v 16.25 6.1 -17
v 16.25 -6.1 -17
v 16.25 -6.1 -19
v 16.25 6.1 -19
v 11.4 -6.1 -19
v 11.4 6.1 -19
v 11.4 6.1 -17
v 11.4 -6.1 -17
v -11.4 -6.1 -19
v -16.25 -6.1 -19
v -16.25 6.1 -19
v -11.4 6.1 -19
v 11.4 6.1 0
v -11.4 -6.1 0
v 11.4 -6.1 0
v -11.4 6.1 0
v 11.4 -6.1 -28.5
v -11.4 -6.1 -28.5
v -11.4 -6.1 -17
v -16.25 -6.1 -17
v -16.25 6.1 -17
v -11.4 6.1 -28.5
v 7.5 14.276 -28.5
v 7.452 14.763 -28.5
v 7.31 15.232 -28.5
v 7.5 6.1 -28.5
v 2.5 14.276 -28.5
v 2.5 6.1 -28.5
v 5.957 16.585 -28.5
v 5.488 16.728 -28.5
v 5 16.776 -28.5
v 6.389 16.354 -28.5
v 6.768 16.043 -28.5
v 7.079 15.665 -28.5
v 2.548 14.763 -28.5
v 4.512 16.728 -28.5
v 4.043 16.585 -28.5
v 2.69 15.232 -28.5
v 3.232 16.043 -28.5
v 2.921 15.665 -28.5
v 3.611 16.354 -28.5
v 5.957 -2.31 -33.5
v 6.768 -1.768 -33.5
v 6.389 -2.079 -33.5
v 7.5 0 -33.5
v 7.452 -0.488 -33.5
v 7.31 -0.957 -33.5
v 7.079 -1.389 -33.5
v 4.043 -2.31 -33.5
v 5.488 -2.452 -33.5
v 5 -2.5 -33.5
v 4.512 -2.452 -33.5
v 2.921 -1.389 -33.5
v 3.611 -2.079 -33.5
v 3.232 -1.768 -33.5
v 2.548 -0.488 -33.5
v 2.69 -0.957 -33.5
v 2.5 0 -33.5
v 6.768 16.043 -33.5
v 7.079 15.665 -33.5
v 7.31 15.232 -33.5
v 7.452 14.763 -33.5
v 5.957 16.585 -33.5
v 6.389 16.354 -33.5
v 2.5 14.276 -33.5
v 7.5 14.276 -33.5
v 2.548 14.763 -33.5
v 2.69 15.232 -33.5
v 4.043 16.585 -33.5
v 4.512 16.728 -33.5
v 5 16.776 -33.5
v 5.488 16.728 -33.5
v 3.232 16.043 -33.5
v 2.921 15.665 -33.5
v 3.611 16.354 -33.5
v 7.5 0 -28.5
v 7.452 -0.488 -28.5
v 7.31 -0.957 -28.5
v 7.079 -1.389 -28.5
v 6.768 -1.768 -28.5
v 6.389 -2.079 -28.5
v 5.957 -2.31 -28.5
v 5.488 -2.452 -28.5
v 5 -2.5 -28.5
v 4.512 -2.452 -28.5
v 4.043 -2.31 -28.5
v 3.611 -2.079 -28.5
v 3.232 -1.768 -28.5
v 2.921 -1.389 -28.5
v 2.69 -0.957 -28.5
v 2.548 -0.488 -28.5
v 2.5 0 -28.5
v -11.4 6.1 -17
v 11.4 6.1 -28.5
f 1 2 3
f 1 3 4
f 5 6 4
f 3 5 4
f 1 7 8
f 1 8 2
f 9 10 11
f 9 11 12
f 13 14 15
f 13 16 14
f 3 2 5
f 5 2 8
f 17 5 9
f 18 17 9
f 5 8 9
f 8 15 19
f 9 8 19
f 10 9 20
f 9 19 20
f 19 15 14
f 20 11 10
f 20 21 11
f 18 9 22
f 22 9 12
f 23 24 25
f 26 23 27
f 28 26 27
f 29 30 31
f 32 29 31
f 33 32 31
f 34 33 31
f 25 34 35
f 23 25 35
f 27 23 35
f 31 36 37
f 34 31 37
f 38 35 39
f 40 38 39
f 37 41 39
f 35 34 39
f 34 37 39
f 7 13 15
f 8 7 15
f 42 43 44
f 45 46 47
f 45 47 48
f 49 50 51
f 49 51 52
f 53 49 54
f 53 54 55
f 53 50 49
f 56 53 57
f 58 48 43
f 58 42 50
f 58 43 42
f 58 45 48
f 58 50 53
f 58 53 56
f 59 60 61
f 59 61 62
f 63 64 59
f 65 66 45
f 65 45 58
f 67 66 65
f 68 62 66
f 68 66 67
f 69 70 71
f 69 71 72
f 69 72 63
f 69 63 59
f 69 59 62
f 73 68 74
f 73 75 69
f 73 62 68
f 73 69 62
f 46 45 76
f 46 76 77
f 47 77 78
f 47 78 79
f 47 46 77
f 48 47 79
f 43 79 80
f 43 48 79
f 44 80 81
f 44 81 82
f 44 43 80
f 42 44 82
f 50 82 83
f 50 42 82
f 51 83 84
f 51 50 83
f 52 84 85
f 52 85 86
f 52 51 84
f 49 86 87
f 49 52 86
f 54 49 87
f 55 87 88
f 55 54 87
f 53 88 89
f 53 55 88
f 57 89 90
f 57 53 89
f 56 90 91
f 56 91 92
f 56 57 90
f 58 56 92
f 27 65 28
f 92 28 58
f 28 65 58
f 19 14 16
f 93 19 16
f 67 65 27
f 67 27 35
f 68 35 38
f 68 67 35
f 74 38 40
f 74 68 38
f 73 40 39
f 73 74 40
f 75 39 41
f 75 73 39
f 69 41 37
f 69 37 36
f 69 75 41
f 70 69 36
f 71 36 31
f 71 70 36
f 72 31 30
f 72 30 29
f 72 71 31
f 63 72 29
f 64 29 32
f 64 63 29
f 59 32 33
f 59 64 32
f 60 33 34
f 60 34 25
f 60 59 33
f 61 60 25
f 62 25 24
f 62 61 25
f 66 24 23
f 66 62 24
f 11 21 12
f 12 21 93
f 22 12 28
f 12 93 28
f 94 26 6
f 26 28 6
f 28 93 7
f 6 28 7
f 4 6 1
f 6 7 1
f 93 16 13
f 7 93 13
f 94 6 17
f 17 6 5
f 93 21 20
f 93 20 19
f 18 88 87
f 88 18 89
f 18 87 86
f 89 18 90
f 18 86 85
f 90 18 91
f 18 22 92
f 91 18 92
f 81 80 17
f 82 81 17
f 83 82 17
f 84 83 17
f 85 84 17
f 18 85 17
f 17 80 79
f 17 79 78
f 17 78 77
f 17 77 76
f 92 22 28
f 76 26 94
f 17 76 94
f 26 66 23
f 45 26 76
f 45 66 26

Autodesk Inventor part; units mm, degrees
ref_plane "YZ Plane" through (0, 0, 0) normal (1, 0, 0) x (0, 1, 0)
ref_plane "XZ Plane" through (0, 0, 0) normal (0, 1, 0) x (-1, 0, 0)
sketch "Náčrt1" plane through (0, 0, 0) normal (0, 0, 1) x (1, 0, 0)
  line L0 (-11.4, 6.1) -> (11.4, 6.1)
  line L1 (11.4, 6.1) -> (11.4, -6.1)
  line L2 (11.4, -6.1) -> (-11.4, -6.1)
  line L3 (-11.4, -6.1) -> (-11.4, 6.1)
  line L4 (0, 8.54) -> (0, -8.54) projected
  line L5 (-15.96, 0) -> (15.96, 0) projected
  point P0 (0, 0)
  dimension "d0" = 22.8
  dimension "d1" = 12.2
extrude "Vysunutí1" add sketch "Náčrt1" against normal blind 28.5
ref_plane "Pracovní rovina1" through (0, 0, -17) normal (0, 0, 1) x (1, 0, 0)
sketch "Náčrt2" plane through (0, 0, -17) normal (0, 0, 1) x (1, 0, 0)
  line L0 (11.4, 6.1) -> (11.4, -6.1) projected
  line L1 (11.4, -6.1) -> (-11.4, -6.1) projected
  line L2 (-11.4, -6.1) -> (-11.4, 6.1) projected
  line L3 (-11.4, 6.1) -> (11.4, 6.1) projected
  line L4 (16.25, 6.1) -> (-16.25, 6.1)
  line L5 (-16.25, 6.1) -> (-16.25, -6.1)
  line L6 (-16.25, -6.1) -> (16.25, -6.1)
  line L7 (16.25, -6.1) -> (16.25, 6.1)
  line L8 (-22.75, 0) -> (22.75, 0) projected
  line L9 (0, 8.54) -> (0, -8.54) projected
  point P0 (0, 0)
  dimension "d5" = 32.5
  dimension "d6" = 12.2
extrude "Vysunutí2" add sketch "Náčrt2" against normal blind 2
ref_plane "Pracovní rovina2" through (5, 0, -33.5) normal (0, 0, -1) x (-1, 0, 0)
sketch "Náčrt4" plane through (5, 0, -33.5) normal (0, 0, -1) x (-1, 0, 0)
  circle A0 centre (0, 0) radius 2.5 projected
  circle A1 centre (0, 14.2756) radius 2.5
  line L0 (2.5, 14.2756) -> (2.5, 0)
  line L1 (-26.45, 0) -> (29.2, 0) projected
  line L2 (5, -10.6881) -> (5, 21.4288) projected
  line L3 (-2.5, 14.2756) -> (-2.5, 0)
  point P0 (5, 0)
  dimension "d15" = 90
  dimension "d16" = 2.5
extrude "Vysunutí4" add sketch "Náčrt4" against normal blind 5
properties part number "Servo" material "LCP plast"
